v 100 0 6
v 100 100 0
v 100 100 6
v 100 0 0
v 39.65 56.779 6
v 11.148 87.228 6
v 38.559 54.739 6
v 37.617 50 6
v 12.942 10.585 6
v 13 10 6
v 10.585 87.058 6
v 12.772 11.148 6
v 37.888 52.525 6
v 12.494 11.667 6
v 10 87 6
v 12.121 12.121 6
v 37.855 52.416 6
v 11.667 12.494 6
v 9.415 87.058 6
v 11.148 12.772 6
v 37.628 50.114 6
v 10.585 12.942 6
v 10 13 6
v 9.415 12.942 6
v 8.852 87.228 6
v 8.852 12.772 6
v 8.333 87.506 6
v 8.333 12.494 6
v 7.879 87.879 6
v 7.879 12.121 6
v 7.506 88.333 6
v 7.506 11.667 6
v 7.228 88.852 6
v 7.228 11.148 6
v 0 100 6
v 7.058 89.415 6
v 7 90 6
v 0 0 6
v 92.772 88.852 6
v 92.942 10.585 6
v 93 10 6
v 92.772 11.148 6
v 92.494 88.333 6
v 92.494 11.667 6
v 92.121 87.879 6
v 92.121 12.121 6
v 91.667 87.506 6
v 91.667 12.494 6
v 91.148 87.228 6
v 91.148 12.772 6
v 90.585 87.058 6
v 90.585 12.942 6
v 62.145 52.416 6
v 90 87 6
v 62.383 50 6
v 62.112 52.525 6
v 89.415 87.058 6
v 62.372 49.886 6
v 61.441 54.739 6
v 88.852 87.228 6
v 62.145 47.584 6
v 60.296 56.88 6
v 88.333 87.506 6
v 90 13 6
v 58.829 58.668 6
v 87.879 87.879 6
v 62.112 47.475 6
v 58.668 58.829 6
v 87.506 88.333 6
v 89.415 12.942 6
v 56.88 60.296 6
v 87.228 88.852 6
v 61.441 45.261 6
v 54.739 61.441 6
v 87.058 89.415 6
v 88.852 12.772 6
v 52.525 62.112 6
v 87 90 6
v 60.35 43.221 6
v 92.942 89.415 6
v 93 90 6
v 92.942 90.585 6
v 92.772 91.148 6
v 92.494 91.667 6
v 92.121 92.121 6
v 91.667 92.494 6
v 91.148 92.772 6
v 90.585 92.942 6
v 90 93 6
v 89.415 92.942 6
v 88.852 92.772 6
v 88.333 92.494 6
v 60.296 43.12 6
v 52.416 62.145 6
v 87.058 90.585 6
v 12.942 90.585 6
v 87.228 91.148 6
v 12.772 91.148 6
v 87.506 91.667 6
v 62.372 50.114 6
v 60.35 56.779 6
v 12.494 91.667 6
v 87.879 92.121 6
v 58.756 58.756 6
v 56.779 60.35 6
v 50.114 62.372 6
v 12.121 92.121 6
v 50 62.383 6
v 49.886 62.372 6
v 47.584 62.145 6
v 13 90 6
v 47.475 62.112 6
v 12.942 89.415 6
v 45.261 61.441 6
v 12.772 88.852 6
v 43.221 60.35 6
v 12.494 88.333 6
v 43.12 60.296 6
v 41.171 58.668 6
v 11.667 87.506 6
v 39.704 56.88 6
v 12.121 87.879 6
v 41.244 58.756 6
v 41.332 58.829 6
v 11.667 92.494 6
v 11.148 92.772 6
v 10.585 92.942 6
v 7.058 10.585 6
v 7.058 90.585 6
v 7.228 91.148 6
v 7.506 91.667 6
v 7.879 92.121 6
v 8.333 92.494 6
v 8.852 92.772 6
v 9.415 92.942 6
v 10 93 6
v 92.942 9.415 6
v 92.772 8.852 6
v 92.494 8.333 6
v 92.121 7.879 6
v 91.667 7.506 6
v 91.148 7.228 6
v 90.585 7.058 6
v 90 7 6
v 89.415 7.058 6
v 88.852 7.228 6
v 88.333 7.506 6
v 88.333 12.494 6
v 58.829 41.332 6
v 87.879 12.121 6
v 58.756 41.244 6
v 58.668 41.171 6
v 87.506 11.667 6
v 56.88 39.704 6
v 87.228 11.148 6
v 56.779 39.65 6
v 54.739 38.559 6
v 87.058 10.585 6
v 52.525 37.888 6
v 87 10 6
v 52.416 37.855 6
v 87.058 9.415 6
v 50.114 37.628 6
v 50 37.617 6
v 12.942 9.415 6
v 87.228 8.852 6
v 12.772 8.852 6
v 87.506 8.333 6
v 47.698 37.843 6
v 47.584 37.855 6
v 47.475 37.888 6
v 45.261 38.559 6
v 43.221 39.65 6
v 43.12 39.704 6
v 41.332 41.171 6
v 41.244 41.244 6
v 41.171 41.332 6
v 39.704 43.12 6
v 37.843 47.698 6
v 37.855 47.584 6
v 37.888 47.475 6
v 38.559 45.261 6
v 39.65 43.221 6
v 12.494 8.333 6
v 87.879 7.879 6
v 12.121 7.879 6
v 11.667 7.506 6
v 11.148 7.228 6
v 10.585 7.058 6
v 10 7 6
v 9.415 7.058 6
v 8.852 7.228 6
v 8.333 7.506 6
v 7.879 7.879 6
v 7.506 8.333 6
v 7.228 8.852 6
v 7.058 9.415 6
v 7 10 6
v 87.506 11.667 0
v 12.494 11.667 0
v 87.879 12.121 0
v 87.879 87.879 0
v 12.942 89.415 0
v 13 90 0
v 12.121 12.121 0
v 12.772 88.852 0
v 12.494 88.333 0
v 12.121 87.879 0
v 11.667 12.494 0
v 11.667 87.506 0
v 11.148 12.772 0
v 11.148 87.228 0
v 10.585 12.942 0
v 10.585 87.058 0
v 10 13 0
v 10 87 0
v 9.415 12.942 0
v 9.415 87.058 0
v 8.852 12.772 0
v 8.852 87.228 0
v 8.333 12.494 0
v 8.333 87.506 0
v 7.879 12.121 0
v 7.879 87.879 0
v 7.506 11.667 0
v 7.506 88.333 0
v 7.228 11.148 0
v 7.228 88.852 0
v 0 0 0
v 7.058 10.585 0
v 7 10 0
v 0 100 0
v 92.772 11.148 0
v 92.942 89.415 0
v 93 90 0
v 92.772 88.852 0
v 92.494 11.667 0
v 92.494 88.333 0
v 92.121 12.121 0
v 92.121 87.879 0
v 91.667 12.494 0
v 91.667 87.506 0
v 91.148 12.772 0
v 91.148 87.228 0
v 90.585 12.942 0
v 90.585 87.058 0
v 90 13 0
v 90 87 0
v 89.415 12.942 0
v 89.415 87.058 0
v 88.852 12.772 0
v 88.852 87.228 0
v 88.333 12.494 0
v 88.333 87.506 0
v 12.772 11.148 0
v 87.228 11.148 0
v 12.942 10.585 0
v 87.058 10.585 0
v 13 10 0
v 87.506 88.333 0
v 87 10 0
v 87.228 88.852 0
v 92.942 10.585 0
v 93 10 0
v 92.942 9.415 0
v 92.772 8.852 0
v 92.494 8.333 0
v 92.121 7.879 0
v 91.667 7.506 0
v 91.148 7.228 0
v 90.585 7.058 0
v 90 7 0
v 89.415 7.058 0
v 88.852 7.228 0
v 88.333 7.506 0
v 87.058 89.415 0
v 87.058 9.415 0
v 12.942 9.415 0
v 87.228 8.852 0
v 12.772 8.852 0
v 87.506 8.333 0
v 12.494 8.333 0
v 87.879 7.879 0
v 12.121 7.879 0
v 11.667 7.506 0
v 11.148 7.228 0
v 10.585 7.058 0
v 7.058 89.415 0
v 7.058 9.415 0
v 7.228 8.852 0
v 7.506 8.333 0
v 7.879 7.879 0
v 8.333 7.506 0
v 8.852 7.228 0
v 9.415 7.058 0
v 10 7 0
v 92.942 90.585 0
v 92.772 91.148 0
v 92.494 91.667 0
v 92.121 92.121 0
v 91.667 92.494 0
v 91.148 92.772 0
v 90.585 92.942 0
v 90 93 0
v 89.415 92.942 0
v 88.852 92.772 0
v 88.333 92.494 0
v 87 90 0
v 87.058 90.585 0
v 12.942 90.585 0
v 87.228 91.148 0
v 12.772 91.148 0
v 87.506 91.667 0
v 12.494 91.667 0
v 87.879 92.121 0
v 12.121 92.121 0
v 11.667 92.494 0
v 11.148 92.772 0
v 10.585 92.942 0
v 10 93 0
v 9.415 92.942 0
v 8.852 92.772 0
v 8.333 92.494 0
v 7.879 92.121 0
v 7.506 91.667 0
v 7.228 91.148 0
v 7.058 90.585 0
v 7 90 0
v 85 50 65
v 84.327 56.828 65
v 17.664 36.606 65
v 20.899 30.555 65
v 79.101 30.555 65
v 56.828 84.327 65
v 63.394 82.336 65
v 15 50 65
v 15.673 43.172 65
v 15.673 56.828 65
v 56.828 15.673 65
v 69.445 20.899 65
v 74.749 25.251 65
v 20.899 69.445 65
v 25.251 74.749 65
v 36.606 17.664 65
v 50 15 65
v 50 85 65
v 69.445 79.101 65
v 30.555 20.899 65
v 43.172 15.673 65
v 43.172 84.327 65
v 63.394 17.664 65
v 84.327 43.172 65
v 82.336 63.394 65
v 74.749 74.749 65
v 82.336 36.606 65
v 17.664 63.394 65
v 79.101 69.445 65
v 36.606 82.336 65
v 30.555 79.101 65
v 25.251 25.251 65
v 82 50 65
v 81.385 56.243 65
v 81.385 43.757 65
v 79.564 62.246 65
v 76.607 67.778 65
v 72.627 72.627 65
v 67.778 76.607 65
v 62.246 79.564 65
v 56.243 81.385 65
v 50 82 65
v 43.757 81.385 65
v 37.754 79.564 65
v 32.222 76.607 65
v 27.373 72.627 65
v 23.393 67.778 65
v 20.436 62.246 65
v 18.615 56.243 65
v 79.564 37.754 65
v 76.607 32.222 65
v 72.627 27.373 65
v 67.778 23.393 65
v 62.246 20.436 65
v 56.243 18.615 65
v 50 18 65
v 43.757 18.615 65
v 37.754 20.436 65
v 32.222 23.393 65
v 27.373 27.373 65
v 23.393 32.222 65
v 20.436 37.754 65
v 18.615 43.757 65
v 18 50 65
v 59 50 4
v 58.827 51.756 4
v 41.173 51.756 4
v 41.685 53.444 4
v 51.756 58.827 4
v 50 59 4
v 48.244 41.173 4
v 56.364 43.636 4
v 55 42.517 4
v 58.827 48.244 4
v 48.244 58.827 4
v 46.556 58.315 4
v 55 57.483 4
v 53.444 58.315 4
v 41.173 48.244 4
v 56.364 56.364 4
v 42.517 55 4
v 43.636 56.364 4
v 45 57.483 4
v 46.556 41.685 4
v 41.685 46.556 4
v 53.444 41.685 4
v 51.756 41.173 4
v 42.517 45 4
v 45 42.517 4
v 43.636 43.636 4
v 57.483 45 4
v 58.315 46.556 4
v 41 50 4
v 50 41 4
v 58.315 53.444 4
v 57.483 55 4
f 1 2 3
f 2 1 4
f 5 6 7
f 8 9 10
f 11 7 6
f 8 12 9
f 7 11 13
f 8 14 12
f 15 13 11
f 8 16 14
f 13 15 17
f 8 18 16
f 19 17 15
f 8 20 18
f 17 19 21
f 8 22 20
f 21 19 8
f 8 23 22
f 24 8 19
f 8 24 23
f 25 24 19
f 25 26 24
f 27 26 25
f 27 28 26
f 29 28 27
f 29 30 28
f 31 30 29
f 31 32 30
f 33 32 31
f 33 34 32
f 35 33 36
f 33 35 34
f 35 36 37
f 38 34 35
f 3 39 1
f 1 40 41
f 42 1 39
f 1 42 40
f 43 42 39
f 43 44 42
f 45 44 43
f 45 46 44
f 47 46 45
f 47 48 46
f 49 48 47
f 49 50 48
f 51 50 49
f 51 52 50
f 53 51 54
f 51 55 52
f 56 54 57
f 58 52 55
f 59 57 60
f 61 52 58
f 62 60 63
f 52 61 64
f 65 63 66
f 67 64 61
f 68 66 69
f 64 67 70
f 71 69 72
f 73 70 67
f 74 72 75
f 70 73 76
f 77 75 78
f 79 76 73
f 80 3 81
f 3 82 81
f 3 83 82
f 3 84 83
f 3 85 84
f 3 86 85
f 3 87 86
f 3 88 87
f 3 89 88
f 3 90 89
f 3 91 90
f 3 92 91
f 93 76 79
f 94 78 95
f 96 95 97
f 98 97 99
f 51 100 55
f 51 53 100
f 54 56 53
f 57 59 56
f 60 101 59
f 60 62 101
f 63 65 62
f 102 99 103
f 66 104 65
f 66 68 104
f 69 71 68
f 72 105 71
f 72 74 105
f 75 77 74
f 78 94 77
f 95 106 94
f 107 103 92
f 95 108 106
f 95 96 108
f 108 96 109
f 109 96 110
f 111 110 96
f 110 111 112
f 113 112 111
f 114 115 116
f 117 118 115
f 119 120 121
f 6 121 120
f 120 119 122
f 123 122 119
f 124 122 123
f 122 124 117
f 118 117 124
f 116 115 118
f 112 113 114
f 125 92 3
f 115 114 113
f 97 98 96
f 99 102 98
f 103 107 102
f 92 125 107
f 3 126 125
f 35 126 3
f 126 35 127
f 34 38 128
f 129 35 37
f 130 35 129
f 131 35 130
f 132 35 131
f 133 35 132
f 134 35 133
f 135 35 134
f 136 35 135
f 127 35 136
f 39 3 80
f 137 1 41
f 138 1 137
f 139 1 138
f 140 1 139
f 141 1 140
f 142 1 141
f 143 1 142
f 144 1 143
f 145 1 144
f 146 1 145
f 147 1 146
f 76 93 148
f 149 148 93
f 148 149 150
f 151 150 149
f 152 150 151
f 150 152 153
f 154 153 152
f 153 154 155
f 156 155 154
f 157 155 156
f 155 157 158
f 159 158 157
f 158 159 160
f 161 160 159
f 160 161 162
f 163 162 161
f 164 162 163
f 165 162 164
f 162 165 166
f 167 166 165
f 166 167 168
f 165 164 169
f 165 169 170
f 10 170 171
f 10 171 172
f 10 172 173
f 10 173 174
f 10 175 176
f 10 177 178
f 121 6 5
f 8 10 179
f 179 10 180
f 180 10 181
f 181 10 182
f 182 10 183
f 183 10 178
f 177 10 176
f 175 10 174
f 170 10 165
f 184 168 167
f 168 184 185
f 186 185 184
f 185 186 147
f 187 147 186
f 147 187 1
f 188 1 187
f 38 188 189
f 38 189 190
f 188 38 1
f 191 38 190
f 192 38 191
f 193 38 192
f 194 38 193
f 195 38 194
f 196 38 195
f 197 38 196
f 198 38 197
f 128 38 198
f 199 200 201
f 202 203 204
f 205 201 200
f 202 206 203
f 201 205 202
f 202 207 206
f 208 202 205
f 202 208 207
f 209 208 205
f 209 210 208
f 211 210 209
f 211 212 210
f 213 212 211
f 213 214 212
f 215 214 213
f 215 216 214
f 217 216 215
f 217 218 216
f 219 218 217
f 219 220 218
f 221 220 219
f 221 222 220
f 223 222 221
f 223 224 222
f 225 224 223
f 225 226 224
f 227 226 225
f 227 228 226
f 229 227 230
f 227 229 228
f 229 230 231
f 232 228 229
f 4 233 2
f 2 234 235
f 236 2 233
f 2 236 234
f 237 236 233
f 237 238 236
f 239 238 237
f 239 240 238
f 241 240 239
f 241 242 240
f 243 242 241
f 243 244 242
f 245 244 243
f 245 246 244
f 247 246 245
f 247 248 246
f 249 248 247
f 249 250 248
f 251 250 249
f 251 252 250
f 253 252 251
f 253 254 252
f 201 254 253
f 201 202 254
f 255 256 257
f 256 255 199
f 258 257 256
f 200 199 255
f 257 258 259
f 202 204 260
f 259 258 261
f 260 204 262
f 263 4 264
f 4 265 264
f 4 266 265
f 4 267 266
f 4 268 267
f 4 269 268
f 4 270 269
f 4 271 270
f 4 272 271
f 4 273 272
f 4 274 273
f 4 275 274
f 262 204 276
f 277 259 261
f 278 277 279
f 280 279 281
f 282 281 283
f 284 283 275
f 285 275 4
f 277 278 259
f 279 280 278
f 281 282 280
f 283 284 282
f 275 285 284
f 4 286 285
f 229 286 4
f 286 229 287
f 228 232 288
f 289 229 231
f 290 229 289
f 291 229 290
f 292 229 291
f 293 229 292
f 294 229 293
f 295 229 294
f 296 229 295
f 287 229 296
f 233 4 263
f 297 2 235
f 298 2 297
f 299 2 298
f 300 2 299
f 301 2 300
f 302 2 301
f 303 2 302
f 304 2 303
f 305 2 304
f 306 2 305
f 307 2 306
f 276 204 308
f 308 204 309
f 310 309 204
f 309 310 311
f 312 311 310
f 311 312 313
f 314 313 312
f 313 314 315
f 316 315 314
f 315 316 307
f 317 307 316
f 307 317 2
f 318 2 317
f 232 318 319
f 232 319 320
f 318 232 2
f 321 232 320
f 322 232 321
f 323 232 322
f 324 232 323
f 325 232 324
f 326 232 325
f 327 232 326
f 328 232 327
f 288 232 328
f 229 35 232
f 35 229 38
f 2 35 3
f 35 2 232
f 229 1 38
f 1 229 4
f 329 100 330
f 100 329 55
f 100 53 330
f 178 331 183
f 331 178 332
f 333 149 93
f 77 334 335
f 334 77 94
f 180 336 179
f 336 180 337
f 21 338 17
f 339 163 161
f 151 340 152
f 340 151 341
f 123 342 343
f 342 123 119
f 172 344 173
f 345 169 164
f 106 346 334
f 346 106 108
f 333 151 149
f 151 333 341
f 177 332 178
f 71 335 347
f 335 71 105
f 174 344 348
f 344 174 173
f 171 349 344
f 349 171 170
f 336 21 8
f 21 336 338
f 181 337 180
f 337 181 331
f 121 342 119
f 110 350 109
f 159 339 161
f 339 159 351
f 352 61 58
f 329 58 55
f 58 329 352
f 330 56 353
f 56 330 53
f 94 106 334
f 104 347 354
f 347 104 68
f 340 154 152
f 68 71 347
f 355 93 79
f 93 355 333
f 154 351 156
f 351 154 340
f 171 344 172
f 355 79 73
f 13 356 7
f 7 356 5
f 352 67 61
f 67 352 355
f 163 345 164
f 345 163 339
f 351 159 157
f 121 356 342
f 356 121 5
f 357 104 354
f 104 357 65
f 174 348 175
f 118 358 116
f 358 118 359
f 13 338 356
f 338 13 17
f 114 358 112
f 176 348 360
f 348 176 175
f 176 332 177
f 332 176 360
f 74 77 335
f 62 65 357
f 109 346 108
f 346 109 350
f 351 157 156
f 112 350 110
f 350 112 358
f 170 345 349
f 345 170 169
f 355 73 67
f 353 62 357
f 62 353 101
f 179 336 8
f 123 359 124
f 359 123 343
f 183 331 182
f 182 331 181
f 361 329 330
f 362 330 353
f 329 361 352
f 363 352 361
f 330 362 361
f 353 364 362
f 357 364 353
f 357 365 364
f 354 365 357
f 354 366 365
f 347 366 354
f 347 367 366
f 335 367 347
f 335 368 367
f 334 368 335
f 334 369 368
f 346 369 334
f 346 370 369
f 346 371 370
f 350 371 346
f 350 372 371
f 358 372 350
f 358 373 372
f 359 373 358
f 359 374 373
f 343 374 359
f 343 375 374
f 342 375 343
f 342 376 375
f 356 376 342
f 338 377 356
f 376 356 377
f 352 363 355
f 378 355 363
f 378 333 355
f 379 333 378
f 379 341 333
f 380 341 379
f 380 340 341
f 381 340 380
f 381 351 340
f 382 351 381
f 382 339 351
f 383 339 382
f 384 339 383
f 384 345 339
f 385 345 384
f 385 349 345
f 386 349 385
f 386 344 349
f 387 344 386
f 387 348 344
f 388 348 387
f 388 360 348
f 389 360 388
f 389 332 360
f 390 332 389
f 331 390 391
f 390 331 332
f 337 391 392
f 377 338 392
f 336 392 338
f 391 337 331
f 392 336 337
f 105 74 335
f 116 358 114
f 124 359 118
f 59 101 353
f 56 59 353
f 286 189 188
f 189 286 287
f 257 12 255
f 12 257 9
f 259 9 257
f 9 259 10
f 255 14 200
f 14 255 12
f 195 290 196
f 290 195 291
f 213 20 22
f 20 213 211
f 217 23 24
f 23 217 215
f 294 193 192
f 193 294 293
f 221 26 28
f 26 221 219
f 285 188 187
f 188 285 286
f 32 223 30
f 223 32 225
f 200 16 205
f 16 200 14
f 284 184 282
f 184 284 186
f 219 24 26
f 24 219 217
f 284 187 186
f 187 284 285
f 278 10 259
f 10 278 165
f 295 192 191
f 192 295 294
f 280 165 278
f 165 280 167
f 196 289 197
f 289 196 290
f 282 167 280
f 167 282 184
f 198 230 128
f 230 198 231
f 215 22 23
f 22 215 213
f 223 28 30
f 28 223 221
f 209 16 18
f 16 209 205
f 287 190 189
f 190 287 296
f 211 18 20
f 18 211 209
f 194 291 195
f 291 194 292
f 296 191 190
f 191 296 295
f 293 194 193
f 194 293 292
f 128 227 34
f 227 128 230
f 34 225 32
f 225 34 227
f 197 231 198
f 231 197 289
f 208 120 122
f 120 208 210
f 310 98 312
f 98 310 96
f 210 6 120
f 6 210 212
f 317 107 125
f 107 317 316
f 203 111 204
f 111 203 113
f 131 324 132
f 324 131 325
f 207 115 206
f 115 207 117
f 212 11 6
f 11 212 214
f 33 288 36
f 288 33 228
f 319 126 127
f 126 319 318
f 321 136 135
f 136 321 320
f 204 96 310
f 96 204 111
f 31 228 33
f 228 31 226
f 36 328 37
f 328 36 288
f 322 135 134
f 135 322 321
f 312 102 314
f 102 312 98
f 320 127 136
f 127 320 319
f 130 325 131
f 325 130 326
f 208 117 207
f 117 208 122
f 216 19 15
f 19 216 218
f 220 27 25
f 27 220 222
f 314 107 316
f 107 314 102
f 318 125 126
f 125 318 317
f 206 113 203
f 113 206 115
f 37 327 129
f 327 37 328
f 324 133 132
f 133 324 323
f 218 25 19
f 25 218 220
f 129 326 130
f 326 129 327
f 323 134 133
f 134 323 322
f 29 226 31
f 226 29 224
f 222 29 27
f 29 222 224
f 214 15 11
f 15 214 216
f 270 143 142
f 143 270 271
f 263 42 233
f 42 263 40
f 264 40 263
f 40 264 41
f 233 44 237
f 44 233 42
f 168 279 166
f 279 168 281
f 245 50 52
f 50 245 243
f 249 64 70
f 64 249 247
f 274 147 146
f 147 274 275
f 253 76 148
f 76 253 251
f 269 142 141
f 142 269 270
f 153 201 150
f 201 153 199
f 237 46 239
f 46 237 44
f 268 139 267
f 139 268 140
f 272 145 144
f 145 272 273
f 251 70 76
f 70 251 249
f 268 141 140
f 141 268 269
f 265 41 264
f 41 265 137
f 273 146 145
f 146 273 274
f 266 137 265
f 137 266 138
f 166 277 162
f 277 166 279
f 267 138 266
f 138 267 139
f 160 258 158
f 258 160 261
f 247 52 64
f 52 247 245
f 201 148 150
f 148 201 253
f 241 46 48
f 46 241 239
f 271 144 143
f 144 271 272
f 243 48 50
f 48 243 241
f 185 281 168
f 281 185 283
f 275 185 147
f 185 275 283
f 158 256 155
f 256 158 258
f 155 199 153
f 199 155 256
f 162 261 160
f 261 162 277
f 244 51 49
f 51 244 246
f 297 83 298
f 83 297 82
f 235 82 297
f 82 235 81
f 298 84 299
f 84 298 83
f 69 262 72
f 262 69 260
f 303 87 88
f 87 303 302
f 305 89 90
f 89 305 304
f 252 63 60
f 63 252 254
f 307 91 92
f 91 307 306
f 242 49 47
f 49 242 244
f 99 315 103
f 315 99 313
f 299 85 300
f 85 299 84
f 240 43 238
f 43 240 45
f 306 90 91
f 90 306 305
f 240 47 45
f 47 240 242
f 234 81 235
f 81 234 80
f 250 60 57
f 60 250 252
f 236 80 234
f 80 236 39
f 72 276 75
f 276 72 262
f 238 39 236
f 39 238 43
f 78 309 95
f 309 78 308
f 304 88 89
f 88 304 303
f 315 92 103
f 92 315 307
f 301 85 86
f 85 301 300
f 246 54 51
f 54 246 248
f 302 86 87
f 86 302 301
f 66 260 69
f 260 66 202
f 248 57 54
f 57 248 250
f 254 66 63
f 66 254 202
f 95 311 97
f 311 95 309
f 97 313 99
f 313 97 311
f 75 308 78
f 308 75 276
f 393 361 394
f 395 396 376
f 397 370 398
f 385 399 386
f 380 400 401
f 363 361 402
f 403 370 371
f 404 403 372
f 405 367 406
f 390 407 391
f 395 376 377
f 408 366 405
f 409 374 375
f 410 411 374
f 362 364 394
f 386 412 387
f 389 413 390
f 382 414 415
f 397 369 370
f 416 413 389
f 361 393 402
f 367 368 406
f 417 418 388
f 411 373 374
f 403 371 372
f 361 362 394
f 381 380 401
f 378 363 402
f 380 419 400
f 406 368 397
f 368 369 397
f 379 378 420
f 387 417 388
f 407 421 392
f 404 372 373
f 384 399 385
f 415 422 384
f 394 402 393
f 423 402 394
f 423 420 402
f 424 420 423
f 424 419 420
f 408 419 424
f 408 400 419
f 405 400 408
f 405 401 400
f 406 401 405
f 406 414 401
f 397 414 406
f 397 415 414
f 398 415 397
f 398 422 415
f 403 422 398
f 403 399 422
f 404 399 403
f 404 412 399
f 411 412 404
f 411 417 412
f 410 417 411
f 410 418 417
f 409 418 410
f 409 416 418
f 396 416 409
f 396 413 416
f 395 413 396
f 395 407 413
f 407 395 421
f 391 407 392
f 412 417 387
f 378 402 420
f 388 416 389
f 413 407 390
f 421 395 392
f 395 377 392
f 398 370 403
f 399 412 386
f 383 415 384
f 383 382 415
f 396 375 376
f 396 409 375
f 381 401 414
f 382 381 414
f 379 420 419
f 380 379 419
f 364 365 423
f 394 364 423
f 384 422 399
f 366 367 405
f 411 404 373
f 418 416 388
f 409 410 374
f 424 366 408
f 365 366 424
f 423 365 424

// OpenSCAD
$fn = 32;

// ----------------------------------------------------------------------
// Hopper: flanged with square flange
// ----------------------------------------------------------------------

// --- parameters (mm) ---
fl = 100;                 // flange side, X and Y
fl_t = 6;                 // flange thickness
cone_h = 60;              // cone height above the flange
top_d = 70;               // cone mouth diameter
bot_d = 24;               // cone spout diameter
wall = 3;                 // cone wall thickness
hole_r = 3;               // flange hole radius
hole_in = 10;             // hole inset from the corners

bore_d = bot_d - 2 * wall;  // spout bore diameter
total_h = fl_t + cone_h - 1;  // overall height

difference() {
  union() {
    cube([fl, fl, fl_t]);
    translate([fl / 2, fl / 2, fl_t - 1])
      cylinder(h = cone_h, d1 = bot_d, d2 = top_d);
  }
  translate([fl / 2, fl / 2, fl_t - 2])
    cylinder(h = cone_h + 1, d1 = bore_d, d2 = top_d - 2 * wall);
  for (sx = [0, 1], sy = [0, 1])
    translate([sx ? fl - hole_in : hole_in,
               sy ? fl - hole_in : hole_in, -1])
      cylinder(r = hole_r, h = fl_t + 2);
}
